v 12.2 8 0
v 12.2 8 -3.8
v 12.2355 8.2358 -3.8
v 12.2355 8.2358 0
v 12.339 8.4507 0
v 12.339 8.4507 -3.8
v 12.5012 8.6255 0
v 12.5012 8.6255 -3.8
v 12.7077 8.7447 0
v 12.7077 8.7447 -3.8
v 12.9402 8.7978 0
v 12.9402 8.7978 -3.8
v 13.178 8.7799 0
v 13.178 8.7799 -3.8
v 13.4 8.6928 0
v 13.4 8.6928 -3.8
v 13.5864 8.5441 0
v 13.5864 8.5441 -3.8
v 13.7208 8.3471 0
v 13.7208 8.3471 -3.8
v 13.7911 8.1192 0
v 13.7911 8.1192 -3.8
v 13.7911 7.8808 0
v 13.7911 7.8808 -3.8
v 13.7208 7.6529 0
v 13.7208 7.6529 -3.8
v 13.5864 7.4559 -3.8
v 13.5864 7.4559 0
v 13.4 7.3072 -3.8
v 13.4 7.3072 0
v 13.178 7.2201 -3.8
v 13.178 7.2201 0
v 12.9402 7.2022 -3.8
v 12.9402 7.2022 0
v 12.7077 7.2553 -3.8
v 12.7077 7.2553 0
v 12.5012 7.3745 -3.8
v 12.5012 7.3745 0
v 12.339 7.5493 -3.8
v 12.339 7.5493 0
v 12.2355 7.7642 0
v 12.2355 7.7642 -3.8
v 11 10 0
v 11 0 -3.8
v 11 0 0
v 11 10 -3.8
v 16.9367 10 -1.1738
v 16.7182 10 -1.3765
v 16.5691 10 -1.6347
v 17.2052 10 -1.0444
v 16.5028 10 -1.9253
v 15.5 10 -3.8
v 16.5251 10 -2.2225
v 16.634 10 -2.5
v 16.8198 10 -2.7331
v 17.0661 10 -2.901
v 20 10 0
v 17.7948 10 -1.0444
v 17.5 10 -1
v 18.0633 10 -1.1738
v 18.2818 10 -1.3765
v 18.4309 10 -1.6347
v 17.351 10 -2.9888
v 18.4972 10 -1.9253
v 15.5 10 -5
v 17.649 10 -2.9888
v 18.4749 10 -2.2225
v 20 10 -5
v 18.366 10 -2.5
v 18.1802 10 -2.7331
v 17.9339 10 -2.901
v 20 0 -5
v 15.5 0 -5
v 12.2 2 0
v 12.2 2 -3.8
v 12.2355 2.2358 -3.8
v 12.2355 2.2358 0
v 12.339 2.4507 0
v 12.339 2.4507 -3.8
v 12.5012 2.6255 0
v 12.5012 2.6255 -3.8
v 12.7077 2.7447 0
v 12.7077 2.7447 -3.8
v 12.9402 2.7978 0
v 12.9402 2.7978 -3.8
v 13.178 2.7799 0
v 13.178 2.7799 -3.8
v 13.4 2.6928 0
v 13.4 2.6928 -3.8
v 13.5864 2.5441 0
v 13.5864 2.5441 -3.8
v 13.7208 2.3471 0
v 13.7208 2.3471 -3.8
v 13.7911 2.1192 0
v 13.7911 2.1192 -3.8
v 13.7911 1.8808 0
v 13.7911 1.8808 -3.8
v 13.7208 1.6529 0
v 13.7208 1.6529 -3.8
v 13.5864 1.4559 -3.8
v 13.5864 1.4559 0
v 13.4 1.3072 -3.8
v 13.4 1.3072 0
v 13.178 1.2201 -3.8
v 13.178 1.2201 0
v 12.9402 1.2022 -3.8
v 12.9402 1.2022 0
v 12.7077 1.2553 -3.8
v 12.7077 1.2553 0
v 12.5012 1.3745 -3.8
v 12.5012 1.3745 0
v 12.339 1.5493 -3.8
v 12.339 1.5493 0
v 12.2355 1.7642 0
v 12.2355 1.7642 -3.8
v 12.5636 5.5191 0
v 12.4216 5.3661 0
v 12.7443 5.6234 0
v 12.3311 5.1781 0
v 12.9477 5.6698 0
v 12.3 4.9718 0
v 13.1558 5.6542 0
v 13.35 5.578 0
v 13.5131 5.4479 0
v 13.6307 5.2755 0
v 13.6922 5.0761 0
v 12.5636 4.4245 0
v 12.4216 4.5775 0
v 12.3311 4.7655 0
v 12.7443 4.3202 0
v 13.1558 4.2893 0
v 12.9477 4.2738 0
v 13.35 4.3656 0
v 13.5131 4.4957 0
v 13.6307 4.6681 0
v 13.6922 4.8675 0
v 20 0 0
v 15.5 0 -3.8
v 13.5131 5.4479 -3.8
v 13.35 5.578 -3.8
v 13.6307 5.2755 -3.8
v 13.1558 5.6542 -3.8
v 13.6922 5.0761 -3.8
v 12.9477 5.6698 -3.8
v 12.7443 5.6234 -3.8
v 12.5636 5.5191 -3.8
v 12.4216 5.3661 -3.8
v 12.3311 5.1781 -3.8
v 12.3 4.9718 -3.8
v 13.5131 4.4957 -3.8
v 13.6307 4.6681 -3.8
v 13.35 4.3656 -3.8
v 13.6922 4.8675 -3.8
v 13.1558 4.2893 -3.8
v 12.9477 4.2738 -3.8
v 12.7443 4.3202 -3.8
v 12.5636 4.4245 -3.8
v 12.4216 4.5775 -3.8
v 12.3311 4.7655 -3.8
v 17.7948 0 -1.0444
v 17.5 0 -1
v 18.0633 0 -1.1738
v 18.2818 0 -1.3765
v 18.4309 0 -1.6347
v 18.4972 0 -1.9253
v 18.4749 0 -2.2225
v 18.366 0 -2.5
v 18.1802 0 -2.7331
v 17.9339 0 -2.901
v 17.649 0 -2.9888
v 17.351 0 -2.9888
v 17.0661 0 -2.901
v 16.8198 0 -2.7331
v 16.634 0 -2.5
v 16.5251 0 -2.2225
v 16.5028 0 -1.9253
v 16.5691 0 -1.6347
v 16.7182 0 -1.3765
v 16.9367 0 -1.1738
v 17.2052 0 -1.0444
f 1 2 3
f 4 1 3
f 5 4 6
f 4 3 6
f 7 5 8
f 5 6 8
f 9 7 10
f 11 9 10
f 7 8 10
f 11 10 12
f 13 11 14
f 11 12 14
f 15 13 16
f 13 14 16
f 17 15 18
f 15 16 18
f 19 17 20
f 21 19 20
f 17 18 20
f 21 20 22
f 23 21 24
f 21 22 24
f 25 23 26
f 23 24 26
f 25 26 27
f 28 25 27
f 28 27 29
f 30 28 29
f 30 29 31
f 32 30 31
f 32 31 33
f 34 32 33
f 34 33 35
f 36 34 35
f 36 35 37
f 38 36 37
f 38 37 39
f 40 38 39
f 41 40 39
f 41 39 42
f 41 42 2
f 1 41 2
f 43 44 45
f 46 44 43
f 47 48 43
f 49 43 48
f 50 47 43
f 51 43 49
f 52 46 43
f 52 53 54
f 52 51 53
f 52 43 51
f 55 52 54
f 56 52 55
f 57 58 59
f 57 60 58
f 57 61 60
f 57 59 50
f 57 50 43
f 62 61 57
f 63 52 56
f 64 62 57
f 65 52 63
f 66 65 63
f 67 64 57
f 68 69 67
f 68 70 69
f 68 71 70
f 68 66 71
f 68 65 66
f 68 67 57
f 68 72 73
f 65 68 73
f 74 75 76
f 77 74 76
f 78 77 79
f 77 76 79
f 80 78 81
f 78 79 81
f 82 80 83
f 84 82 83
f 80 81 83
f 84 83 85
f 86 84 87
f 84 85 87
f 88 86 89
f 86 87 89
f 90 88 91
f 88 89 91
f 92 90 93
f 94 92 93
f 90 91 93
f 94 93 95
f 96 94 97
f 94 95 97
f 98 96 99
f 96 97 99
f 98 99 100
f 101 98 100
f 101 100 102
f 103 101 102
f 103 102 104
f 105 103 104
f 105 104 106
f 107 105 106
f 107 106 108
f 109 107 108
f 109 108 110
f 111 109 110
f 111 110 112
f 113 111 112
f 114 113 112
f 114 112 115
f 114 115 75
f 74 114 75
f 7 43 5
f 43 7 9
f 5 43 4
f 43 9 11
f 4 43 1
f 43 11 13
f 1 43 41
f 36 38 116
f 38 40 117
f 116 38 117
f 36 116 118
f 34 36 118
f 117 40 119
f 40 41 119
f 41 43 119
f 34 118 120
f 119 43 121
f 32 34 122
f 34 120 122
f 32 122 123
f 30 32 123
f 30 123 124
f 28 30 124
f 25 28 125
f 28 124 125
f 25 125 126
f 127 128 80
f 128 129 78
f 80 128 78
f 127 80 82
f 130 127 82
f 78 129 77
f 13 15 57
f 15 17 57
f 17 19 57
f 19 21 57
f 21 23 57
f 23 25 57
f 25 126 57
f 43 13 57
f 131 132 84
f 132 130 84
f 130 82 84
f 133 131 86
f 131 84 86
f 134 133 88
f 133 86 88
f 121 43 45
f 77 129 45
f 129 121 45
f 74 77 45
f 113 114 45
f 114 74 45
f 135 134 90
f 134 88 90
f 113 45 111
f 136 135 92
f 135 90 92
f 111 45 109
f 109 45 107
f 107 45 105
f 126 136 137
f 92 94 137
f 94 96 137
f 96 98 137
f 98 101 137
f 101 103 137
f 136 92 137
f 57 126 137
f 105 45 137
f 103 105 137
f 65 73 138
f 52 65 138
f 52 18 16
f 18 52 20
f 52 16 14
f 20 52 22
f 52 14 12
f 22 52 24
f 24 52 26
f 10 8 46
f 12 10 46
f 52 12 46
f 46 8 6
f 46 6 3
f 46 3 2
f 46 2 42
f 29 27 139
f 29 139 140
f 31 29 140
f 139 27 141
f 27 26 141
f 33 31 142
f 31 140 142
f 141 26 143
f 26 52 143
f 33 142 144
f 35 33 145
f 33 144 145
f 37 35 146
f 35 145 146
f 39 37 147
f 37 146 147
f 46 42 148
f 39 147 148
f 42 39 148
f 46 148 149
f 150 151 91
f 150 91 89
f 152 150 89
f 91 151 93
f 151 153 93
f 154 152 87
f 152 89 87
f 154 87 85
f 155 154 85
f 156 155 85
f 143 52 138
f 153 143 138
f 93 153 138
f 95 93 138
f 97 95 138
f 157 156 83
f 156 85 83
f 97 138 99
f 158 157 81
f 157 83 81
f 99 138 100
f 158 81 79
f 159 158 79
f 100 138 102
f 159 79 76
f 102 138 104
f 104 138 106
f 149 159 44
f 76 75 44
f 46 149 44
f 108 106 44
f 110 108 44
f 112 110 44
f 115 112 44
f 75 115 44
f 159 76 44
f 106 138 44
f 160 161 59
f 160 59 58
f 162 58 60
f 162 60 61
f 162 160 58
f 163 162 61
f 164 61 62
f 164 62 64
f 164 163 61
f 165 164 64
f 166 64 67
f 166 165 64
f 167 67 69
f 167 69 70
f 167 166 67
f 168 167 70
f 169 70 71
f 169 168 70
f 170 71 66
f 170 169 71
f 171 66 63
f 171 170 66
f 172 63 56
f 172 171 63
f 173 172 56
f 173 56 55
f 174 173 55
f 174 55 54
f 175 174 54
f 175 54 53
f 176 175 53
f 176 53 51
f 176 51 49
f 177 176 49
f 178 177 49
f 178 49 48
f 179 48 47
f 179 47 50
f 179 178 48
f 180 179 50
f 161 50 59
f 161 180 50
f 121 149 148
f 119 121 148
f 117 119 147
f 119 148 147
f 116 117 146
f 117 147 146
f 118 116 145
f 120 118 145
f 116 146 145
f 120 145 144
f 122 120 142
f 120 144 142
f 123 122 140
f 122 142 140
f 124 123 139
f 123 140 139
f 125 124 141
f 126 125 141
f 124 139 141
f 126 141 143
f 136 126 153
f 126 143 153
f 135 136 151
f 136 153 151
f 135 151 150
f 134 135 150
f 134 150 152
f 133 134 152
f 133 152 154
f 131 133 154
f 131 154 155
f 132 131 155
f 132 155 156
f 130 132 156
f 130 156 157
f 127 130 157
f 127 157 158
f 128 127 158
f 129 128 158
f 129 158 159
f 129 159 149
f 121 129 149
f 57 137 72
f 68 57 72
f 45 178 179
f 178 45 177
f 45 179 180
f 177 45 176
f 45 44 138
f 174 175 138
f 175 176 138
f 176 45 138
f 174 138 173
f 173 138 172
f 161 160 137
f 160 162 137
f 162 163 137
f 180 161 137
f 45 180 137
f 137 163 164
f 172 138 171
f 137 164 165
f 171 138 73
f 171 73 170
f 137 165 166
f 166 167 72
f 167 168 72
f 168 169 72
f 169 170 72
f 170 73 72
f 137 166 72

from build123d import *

# Parameters (mm, degrees)
SKETCH1_R           = 1
BOSS_EXTRUDE1_DEPTH = 10
SKETCH5_R           = 0.7
SKETCH5_R_2         = 0.8
SKETCH5_R_3         = 2
CUT_EXTRUDE3_DEPTH  = 23.681269806
SKETCH7_W           = 11
SKETCH7_H           = 15.934078747
CUT_EXTRUDE4_DEPTH  = 23.681269806


with BuildPart() as part:
    # Sketch1 → Boss-Extrude1 (new body)
    with BuildSketch(Plane(origin=(0, 0, 0), x_dir=(1, 0, 0), z_dir=(0, 1, 0))):
        Polygon((0, 0), (20, 0), (20, 5), (15.5, 5), (15.5, 3.8), (0, 3.8), align=None)
        with Locations(Location((2.5, 2, 0), (0, 0, 270))):
            Circle(SKETCH1_R, mode=Mode.SUBTRACT)
        with Locations(Location((17.5, 2, 0), (0, 0, 270))):
            Circle(SKETCH1_R, mode=Mode.SUBTRACT)
    extrude(amount=BOSS_EXTRUDE1_DEPTH)

    # Sketch5 → Cut-Extrude3 (cut, through all)
    with BuildSketch(Plane(origin=(0, 0, -3.8), x_dir=(-1, 0, 0), z_dir=(0, 0, -1))):
        with Locations((-13, 4.971794193)):
            Circle(SKETCH5_R)
        with Locations((-13, 8)):
            Circle(SKETCH5_R_2)
        with Locations((-6.5, 4)):
            Circle(SKETCH5_R_3)
        with Locations((-13, 2)):
            Circle(SKETCH5_R_2)
    extrude(amount=-CUT_EXTRUDE3_DEPTH, mode=Mode.SUBTRACT)

    # Sketch7 → Cut-Extrude4 (cut, through all)
    with BuildSketch(Plane(origin=(0, 0, -3.8), x_dir=(-1, 0, 0), z_dir=(0, 0, -1))):
        with Locations((-5.5, 5.758979145)):
            Rectangle(SKETCH7_W, SKETCH7_H)
    extrude(amount=-CUT_EXTRUDE4_DEPTH, mode=Mode.SUBTRACT)


solid = part.part
